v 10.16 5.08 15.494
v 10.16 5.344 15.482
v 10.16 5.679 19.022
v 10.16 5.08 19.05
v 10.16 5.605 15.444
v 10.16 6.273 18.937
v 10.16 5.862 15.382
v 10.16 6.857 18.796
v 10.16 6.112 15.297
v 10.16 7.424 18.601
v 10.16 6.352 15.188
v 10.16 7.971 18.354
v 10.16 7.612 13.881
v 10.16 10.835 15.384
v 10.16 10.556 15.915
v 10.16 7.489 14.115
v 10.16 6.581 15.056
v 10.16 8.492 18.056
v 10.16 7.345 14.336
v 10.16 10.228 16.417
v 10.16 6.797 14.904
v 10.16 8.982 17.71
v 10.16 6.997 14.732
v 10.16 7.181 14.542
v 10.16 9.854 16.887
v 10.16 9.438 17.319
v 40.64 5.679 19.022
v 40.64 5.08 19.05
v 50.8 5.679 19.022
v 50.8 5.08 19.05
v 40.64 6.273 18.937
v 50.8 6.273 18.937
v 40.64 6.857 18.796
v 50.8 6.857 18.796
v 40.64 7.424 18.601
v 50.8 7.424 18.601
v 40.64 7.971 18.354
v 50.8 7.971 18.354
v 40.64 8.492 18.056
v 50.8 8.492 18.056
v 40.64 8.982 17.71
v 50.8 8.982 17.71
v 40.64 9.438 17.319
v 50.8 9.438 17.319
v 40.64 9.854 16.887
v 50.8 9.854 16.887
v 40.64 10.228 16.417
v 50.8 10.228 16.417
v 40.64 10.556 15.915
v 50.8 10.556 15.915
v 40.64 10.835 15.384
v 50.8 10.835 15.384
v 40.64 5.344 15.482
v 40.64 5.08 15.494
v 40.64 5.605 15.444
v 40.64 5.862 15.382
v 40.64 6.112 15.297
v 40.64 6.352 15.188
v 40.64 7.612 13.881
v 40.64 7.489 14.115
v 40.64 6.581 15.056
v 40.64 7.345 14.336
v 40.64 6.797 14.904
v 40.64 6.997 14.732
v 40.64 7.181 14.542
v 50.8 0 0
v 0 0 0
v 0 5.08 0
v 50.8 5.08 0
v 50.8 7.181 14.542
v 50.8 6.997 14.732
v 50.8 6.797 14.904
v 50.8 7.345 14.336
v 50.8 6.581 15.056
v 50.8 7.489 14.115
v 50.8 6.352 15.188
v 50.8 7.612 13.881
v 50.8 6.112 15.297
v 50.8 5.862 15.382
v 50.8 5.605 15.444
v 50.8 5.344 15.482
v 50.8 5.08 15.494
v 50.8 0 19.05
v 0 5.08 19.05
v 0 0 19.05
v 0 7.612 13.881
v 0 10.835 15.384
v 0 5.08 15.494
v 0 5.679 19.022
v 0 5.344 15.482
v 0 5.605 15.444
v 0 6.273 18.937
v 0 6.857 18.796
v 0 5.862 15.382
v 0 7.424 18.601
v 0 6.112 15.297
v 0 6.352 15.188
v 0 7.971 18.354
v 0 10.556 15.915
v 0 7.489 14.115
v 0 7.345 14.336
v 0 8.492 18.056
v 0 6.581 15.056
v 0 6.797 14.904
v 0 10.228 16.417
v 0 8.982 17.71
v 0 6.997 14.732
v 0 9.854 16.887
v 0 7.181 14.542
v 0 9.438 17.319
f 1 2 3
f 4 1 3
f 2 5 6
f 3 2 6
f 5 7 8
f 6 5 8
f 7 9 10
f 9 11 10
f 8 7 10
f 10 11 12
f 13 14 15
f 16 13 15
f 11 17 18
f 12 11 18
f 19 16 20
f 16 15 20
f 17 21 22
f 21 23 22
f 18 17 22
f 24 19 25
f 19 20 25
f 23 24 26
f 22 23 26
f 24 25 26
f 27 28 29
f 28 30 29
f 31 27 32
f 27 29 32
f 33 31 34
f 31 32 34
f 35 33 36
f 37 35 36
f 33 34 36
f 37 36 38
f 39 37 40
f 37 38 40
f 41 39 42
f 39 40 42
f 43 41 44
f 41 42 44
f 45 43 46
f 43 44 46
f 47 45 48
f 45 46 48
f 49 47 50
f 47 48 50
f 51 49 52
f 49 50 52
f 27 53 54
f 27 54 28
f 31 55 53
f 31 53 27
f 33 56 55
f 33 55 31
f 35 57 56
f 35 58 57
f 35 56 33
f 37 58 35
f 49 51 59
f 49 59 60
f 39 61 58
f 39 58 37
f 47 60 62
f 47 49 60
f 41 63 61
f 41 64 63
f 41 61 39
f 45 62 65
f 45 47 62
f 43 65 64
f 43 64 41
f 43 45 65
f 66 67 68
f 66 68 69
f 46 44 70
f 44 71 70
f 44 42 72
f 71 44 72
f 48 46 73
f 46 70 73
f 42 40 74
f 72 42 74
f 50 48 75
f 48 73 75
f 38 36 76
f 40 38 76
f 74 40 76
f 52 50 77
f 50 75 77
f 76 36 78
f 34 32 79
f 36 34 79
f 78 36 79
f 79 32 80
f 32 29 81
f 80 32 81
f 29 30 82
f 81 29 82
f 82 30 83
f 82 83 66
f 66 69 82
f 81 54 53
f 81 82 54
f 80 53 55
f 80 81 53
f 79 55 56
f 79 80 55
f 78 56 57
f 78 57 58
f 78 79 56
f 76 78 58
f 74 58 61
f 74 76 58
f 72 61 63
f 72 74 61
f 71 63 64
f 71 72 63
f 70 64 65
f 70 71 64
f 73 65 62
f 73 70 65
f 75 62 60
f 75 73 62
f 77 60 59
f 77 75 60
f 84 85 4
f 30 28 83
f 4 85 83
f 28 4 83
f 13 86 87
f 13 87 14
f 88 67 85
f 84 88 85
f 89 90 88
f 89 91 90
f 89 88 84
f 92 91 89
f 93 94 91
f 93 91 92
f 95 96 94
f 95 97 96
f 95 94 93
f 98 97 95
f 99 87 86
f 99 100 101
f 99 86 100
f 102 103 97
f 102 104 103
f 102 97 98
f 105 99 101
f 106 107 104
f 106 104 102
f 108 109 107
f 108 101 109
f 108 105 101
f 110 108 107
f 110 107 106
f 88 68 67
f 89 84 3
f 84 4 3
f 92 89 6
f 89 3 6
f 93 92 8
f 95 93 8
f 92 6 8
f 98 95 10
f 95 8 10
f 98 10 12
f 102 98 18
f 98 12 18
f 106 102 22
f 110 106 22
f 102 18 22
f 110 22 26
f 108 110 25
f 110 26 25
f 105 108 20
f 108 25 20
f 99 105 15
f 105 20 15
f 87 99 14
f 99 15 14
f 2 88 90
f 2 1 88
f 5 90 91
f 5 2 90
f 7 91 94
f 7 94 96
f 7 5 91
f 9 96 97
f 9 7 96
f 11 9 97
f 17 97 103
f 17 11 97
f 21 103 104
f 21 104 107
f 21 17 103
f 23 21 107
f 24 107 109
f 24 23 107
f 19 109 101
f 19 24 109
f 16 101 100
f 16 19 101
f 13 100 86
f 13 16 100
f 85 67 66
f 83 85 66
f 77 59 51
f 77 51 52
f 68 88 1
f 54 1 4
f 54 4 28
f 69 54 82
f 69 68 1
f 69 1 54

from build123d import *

# Parameters (mm, degrees)
SKETCH1_W           = 50.8
SKETCH1_H           = 19.05
BOSS_EXTRUDE1_DEPTH = 5.08
SKETCH2_W           = 10.16
SKETCH2_H           = 3.556
REVOLVE1_ANGLE      = 65


with BuildPart() as part:
    # Sketch1 → Boss-Extrude1 (new body)
    with BuildSketch(Plane(origin=(0, 0, 0), x_dir=(1, 0, 0), z_dir=(0, 1, 0))):
        with Locations((25.4, -9.525)):
            Rectangle(SKETCH1_W, SKETCH1_H)
    extrude(amount=BOSS_EXTRUDE1_DEPTH)

    # Sketch2 → Revolve1 (revolve)
    with BuildSketch(Plane(origin=(0, 5.08, 0), x_dir=(1, 0, 0), z_dir=(0, 1, 0))):
        with Locations((5.08, -17.272)):
            Rectangle(SKETCH2_W, SKETCH2_H)
        with Locations((45.72, -17.272)):
            Rectangle(SKETCH2_W, SKETCH2_H)
    revolve(axis=Axis((0, 5.08, 12.7), (-1, 0, 0)), revolution_arc=REVOLVE1_ANGLE)


solid = part.part
